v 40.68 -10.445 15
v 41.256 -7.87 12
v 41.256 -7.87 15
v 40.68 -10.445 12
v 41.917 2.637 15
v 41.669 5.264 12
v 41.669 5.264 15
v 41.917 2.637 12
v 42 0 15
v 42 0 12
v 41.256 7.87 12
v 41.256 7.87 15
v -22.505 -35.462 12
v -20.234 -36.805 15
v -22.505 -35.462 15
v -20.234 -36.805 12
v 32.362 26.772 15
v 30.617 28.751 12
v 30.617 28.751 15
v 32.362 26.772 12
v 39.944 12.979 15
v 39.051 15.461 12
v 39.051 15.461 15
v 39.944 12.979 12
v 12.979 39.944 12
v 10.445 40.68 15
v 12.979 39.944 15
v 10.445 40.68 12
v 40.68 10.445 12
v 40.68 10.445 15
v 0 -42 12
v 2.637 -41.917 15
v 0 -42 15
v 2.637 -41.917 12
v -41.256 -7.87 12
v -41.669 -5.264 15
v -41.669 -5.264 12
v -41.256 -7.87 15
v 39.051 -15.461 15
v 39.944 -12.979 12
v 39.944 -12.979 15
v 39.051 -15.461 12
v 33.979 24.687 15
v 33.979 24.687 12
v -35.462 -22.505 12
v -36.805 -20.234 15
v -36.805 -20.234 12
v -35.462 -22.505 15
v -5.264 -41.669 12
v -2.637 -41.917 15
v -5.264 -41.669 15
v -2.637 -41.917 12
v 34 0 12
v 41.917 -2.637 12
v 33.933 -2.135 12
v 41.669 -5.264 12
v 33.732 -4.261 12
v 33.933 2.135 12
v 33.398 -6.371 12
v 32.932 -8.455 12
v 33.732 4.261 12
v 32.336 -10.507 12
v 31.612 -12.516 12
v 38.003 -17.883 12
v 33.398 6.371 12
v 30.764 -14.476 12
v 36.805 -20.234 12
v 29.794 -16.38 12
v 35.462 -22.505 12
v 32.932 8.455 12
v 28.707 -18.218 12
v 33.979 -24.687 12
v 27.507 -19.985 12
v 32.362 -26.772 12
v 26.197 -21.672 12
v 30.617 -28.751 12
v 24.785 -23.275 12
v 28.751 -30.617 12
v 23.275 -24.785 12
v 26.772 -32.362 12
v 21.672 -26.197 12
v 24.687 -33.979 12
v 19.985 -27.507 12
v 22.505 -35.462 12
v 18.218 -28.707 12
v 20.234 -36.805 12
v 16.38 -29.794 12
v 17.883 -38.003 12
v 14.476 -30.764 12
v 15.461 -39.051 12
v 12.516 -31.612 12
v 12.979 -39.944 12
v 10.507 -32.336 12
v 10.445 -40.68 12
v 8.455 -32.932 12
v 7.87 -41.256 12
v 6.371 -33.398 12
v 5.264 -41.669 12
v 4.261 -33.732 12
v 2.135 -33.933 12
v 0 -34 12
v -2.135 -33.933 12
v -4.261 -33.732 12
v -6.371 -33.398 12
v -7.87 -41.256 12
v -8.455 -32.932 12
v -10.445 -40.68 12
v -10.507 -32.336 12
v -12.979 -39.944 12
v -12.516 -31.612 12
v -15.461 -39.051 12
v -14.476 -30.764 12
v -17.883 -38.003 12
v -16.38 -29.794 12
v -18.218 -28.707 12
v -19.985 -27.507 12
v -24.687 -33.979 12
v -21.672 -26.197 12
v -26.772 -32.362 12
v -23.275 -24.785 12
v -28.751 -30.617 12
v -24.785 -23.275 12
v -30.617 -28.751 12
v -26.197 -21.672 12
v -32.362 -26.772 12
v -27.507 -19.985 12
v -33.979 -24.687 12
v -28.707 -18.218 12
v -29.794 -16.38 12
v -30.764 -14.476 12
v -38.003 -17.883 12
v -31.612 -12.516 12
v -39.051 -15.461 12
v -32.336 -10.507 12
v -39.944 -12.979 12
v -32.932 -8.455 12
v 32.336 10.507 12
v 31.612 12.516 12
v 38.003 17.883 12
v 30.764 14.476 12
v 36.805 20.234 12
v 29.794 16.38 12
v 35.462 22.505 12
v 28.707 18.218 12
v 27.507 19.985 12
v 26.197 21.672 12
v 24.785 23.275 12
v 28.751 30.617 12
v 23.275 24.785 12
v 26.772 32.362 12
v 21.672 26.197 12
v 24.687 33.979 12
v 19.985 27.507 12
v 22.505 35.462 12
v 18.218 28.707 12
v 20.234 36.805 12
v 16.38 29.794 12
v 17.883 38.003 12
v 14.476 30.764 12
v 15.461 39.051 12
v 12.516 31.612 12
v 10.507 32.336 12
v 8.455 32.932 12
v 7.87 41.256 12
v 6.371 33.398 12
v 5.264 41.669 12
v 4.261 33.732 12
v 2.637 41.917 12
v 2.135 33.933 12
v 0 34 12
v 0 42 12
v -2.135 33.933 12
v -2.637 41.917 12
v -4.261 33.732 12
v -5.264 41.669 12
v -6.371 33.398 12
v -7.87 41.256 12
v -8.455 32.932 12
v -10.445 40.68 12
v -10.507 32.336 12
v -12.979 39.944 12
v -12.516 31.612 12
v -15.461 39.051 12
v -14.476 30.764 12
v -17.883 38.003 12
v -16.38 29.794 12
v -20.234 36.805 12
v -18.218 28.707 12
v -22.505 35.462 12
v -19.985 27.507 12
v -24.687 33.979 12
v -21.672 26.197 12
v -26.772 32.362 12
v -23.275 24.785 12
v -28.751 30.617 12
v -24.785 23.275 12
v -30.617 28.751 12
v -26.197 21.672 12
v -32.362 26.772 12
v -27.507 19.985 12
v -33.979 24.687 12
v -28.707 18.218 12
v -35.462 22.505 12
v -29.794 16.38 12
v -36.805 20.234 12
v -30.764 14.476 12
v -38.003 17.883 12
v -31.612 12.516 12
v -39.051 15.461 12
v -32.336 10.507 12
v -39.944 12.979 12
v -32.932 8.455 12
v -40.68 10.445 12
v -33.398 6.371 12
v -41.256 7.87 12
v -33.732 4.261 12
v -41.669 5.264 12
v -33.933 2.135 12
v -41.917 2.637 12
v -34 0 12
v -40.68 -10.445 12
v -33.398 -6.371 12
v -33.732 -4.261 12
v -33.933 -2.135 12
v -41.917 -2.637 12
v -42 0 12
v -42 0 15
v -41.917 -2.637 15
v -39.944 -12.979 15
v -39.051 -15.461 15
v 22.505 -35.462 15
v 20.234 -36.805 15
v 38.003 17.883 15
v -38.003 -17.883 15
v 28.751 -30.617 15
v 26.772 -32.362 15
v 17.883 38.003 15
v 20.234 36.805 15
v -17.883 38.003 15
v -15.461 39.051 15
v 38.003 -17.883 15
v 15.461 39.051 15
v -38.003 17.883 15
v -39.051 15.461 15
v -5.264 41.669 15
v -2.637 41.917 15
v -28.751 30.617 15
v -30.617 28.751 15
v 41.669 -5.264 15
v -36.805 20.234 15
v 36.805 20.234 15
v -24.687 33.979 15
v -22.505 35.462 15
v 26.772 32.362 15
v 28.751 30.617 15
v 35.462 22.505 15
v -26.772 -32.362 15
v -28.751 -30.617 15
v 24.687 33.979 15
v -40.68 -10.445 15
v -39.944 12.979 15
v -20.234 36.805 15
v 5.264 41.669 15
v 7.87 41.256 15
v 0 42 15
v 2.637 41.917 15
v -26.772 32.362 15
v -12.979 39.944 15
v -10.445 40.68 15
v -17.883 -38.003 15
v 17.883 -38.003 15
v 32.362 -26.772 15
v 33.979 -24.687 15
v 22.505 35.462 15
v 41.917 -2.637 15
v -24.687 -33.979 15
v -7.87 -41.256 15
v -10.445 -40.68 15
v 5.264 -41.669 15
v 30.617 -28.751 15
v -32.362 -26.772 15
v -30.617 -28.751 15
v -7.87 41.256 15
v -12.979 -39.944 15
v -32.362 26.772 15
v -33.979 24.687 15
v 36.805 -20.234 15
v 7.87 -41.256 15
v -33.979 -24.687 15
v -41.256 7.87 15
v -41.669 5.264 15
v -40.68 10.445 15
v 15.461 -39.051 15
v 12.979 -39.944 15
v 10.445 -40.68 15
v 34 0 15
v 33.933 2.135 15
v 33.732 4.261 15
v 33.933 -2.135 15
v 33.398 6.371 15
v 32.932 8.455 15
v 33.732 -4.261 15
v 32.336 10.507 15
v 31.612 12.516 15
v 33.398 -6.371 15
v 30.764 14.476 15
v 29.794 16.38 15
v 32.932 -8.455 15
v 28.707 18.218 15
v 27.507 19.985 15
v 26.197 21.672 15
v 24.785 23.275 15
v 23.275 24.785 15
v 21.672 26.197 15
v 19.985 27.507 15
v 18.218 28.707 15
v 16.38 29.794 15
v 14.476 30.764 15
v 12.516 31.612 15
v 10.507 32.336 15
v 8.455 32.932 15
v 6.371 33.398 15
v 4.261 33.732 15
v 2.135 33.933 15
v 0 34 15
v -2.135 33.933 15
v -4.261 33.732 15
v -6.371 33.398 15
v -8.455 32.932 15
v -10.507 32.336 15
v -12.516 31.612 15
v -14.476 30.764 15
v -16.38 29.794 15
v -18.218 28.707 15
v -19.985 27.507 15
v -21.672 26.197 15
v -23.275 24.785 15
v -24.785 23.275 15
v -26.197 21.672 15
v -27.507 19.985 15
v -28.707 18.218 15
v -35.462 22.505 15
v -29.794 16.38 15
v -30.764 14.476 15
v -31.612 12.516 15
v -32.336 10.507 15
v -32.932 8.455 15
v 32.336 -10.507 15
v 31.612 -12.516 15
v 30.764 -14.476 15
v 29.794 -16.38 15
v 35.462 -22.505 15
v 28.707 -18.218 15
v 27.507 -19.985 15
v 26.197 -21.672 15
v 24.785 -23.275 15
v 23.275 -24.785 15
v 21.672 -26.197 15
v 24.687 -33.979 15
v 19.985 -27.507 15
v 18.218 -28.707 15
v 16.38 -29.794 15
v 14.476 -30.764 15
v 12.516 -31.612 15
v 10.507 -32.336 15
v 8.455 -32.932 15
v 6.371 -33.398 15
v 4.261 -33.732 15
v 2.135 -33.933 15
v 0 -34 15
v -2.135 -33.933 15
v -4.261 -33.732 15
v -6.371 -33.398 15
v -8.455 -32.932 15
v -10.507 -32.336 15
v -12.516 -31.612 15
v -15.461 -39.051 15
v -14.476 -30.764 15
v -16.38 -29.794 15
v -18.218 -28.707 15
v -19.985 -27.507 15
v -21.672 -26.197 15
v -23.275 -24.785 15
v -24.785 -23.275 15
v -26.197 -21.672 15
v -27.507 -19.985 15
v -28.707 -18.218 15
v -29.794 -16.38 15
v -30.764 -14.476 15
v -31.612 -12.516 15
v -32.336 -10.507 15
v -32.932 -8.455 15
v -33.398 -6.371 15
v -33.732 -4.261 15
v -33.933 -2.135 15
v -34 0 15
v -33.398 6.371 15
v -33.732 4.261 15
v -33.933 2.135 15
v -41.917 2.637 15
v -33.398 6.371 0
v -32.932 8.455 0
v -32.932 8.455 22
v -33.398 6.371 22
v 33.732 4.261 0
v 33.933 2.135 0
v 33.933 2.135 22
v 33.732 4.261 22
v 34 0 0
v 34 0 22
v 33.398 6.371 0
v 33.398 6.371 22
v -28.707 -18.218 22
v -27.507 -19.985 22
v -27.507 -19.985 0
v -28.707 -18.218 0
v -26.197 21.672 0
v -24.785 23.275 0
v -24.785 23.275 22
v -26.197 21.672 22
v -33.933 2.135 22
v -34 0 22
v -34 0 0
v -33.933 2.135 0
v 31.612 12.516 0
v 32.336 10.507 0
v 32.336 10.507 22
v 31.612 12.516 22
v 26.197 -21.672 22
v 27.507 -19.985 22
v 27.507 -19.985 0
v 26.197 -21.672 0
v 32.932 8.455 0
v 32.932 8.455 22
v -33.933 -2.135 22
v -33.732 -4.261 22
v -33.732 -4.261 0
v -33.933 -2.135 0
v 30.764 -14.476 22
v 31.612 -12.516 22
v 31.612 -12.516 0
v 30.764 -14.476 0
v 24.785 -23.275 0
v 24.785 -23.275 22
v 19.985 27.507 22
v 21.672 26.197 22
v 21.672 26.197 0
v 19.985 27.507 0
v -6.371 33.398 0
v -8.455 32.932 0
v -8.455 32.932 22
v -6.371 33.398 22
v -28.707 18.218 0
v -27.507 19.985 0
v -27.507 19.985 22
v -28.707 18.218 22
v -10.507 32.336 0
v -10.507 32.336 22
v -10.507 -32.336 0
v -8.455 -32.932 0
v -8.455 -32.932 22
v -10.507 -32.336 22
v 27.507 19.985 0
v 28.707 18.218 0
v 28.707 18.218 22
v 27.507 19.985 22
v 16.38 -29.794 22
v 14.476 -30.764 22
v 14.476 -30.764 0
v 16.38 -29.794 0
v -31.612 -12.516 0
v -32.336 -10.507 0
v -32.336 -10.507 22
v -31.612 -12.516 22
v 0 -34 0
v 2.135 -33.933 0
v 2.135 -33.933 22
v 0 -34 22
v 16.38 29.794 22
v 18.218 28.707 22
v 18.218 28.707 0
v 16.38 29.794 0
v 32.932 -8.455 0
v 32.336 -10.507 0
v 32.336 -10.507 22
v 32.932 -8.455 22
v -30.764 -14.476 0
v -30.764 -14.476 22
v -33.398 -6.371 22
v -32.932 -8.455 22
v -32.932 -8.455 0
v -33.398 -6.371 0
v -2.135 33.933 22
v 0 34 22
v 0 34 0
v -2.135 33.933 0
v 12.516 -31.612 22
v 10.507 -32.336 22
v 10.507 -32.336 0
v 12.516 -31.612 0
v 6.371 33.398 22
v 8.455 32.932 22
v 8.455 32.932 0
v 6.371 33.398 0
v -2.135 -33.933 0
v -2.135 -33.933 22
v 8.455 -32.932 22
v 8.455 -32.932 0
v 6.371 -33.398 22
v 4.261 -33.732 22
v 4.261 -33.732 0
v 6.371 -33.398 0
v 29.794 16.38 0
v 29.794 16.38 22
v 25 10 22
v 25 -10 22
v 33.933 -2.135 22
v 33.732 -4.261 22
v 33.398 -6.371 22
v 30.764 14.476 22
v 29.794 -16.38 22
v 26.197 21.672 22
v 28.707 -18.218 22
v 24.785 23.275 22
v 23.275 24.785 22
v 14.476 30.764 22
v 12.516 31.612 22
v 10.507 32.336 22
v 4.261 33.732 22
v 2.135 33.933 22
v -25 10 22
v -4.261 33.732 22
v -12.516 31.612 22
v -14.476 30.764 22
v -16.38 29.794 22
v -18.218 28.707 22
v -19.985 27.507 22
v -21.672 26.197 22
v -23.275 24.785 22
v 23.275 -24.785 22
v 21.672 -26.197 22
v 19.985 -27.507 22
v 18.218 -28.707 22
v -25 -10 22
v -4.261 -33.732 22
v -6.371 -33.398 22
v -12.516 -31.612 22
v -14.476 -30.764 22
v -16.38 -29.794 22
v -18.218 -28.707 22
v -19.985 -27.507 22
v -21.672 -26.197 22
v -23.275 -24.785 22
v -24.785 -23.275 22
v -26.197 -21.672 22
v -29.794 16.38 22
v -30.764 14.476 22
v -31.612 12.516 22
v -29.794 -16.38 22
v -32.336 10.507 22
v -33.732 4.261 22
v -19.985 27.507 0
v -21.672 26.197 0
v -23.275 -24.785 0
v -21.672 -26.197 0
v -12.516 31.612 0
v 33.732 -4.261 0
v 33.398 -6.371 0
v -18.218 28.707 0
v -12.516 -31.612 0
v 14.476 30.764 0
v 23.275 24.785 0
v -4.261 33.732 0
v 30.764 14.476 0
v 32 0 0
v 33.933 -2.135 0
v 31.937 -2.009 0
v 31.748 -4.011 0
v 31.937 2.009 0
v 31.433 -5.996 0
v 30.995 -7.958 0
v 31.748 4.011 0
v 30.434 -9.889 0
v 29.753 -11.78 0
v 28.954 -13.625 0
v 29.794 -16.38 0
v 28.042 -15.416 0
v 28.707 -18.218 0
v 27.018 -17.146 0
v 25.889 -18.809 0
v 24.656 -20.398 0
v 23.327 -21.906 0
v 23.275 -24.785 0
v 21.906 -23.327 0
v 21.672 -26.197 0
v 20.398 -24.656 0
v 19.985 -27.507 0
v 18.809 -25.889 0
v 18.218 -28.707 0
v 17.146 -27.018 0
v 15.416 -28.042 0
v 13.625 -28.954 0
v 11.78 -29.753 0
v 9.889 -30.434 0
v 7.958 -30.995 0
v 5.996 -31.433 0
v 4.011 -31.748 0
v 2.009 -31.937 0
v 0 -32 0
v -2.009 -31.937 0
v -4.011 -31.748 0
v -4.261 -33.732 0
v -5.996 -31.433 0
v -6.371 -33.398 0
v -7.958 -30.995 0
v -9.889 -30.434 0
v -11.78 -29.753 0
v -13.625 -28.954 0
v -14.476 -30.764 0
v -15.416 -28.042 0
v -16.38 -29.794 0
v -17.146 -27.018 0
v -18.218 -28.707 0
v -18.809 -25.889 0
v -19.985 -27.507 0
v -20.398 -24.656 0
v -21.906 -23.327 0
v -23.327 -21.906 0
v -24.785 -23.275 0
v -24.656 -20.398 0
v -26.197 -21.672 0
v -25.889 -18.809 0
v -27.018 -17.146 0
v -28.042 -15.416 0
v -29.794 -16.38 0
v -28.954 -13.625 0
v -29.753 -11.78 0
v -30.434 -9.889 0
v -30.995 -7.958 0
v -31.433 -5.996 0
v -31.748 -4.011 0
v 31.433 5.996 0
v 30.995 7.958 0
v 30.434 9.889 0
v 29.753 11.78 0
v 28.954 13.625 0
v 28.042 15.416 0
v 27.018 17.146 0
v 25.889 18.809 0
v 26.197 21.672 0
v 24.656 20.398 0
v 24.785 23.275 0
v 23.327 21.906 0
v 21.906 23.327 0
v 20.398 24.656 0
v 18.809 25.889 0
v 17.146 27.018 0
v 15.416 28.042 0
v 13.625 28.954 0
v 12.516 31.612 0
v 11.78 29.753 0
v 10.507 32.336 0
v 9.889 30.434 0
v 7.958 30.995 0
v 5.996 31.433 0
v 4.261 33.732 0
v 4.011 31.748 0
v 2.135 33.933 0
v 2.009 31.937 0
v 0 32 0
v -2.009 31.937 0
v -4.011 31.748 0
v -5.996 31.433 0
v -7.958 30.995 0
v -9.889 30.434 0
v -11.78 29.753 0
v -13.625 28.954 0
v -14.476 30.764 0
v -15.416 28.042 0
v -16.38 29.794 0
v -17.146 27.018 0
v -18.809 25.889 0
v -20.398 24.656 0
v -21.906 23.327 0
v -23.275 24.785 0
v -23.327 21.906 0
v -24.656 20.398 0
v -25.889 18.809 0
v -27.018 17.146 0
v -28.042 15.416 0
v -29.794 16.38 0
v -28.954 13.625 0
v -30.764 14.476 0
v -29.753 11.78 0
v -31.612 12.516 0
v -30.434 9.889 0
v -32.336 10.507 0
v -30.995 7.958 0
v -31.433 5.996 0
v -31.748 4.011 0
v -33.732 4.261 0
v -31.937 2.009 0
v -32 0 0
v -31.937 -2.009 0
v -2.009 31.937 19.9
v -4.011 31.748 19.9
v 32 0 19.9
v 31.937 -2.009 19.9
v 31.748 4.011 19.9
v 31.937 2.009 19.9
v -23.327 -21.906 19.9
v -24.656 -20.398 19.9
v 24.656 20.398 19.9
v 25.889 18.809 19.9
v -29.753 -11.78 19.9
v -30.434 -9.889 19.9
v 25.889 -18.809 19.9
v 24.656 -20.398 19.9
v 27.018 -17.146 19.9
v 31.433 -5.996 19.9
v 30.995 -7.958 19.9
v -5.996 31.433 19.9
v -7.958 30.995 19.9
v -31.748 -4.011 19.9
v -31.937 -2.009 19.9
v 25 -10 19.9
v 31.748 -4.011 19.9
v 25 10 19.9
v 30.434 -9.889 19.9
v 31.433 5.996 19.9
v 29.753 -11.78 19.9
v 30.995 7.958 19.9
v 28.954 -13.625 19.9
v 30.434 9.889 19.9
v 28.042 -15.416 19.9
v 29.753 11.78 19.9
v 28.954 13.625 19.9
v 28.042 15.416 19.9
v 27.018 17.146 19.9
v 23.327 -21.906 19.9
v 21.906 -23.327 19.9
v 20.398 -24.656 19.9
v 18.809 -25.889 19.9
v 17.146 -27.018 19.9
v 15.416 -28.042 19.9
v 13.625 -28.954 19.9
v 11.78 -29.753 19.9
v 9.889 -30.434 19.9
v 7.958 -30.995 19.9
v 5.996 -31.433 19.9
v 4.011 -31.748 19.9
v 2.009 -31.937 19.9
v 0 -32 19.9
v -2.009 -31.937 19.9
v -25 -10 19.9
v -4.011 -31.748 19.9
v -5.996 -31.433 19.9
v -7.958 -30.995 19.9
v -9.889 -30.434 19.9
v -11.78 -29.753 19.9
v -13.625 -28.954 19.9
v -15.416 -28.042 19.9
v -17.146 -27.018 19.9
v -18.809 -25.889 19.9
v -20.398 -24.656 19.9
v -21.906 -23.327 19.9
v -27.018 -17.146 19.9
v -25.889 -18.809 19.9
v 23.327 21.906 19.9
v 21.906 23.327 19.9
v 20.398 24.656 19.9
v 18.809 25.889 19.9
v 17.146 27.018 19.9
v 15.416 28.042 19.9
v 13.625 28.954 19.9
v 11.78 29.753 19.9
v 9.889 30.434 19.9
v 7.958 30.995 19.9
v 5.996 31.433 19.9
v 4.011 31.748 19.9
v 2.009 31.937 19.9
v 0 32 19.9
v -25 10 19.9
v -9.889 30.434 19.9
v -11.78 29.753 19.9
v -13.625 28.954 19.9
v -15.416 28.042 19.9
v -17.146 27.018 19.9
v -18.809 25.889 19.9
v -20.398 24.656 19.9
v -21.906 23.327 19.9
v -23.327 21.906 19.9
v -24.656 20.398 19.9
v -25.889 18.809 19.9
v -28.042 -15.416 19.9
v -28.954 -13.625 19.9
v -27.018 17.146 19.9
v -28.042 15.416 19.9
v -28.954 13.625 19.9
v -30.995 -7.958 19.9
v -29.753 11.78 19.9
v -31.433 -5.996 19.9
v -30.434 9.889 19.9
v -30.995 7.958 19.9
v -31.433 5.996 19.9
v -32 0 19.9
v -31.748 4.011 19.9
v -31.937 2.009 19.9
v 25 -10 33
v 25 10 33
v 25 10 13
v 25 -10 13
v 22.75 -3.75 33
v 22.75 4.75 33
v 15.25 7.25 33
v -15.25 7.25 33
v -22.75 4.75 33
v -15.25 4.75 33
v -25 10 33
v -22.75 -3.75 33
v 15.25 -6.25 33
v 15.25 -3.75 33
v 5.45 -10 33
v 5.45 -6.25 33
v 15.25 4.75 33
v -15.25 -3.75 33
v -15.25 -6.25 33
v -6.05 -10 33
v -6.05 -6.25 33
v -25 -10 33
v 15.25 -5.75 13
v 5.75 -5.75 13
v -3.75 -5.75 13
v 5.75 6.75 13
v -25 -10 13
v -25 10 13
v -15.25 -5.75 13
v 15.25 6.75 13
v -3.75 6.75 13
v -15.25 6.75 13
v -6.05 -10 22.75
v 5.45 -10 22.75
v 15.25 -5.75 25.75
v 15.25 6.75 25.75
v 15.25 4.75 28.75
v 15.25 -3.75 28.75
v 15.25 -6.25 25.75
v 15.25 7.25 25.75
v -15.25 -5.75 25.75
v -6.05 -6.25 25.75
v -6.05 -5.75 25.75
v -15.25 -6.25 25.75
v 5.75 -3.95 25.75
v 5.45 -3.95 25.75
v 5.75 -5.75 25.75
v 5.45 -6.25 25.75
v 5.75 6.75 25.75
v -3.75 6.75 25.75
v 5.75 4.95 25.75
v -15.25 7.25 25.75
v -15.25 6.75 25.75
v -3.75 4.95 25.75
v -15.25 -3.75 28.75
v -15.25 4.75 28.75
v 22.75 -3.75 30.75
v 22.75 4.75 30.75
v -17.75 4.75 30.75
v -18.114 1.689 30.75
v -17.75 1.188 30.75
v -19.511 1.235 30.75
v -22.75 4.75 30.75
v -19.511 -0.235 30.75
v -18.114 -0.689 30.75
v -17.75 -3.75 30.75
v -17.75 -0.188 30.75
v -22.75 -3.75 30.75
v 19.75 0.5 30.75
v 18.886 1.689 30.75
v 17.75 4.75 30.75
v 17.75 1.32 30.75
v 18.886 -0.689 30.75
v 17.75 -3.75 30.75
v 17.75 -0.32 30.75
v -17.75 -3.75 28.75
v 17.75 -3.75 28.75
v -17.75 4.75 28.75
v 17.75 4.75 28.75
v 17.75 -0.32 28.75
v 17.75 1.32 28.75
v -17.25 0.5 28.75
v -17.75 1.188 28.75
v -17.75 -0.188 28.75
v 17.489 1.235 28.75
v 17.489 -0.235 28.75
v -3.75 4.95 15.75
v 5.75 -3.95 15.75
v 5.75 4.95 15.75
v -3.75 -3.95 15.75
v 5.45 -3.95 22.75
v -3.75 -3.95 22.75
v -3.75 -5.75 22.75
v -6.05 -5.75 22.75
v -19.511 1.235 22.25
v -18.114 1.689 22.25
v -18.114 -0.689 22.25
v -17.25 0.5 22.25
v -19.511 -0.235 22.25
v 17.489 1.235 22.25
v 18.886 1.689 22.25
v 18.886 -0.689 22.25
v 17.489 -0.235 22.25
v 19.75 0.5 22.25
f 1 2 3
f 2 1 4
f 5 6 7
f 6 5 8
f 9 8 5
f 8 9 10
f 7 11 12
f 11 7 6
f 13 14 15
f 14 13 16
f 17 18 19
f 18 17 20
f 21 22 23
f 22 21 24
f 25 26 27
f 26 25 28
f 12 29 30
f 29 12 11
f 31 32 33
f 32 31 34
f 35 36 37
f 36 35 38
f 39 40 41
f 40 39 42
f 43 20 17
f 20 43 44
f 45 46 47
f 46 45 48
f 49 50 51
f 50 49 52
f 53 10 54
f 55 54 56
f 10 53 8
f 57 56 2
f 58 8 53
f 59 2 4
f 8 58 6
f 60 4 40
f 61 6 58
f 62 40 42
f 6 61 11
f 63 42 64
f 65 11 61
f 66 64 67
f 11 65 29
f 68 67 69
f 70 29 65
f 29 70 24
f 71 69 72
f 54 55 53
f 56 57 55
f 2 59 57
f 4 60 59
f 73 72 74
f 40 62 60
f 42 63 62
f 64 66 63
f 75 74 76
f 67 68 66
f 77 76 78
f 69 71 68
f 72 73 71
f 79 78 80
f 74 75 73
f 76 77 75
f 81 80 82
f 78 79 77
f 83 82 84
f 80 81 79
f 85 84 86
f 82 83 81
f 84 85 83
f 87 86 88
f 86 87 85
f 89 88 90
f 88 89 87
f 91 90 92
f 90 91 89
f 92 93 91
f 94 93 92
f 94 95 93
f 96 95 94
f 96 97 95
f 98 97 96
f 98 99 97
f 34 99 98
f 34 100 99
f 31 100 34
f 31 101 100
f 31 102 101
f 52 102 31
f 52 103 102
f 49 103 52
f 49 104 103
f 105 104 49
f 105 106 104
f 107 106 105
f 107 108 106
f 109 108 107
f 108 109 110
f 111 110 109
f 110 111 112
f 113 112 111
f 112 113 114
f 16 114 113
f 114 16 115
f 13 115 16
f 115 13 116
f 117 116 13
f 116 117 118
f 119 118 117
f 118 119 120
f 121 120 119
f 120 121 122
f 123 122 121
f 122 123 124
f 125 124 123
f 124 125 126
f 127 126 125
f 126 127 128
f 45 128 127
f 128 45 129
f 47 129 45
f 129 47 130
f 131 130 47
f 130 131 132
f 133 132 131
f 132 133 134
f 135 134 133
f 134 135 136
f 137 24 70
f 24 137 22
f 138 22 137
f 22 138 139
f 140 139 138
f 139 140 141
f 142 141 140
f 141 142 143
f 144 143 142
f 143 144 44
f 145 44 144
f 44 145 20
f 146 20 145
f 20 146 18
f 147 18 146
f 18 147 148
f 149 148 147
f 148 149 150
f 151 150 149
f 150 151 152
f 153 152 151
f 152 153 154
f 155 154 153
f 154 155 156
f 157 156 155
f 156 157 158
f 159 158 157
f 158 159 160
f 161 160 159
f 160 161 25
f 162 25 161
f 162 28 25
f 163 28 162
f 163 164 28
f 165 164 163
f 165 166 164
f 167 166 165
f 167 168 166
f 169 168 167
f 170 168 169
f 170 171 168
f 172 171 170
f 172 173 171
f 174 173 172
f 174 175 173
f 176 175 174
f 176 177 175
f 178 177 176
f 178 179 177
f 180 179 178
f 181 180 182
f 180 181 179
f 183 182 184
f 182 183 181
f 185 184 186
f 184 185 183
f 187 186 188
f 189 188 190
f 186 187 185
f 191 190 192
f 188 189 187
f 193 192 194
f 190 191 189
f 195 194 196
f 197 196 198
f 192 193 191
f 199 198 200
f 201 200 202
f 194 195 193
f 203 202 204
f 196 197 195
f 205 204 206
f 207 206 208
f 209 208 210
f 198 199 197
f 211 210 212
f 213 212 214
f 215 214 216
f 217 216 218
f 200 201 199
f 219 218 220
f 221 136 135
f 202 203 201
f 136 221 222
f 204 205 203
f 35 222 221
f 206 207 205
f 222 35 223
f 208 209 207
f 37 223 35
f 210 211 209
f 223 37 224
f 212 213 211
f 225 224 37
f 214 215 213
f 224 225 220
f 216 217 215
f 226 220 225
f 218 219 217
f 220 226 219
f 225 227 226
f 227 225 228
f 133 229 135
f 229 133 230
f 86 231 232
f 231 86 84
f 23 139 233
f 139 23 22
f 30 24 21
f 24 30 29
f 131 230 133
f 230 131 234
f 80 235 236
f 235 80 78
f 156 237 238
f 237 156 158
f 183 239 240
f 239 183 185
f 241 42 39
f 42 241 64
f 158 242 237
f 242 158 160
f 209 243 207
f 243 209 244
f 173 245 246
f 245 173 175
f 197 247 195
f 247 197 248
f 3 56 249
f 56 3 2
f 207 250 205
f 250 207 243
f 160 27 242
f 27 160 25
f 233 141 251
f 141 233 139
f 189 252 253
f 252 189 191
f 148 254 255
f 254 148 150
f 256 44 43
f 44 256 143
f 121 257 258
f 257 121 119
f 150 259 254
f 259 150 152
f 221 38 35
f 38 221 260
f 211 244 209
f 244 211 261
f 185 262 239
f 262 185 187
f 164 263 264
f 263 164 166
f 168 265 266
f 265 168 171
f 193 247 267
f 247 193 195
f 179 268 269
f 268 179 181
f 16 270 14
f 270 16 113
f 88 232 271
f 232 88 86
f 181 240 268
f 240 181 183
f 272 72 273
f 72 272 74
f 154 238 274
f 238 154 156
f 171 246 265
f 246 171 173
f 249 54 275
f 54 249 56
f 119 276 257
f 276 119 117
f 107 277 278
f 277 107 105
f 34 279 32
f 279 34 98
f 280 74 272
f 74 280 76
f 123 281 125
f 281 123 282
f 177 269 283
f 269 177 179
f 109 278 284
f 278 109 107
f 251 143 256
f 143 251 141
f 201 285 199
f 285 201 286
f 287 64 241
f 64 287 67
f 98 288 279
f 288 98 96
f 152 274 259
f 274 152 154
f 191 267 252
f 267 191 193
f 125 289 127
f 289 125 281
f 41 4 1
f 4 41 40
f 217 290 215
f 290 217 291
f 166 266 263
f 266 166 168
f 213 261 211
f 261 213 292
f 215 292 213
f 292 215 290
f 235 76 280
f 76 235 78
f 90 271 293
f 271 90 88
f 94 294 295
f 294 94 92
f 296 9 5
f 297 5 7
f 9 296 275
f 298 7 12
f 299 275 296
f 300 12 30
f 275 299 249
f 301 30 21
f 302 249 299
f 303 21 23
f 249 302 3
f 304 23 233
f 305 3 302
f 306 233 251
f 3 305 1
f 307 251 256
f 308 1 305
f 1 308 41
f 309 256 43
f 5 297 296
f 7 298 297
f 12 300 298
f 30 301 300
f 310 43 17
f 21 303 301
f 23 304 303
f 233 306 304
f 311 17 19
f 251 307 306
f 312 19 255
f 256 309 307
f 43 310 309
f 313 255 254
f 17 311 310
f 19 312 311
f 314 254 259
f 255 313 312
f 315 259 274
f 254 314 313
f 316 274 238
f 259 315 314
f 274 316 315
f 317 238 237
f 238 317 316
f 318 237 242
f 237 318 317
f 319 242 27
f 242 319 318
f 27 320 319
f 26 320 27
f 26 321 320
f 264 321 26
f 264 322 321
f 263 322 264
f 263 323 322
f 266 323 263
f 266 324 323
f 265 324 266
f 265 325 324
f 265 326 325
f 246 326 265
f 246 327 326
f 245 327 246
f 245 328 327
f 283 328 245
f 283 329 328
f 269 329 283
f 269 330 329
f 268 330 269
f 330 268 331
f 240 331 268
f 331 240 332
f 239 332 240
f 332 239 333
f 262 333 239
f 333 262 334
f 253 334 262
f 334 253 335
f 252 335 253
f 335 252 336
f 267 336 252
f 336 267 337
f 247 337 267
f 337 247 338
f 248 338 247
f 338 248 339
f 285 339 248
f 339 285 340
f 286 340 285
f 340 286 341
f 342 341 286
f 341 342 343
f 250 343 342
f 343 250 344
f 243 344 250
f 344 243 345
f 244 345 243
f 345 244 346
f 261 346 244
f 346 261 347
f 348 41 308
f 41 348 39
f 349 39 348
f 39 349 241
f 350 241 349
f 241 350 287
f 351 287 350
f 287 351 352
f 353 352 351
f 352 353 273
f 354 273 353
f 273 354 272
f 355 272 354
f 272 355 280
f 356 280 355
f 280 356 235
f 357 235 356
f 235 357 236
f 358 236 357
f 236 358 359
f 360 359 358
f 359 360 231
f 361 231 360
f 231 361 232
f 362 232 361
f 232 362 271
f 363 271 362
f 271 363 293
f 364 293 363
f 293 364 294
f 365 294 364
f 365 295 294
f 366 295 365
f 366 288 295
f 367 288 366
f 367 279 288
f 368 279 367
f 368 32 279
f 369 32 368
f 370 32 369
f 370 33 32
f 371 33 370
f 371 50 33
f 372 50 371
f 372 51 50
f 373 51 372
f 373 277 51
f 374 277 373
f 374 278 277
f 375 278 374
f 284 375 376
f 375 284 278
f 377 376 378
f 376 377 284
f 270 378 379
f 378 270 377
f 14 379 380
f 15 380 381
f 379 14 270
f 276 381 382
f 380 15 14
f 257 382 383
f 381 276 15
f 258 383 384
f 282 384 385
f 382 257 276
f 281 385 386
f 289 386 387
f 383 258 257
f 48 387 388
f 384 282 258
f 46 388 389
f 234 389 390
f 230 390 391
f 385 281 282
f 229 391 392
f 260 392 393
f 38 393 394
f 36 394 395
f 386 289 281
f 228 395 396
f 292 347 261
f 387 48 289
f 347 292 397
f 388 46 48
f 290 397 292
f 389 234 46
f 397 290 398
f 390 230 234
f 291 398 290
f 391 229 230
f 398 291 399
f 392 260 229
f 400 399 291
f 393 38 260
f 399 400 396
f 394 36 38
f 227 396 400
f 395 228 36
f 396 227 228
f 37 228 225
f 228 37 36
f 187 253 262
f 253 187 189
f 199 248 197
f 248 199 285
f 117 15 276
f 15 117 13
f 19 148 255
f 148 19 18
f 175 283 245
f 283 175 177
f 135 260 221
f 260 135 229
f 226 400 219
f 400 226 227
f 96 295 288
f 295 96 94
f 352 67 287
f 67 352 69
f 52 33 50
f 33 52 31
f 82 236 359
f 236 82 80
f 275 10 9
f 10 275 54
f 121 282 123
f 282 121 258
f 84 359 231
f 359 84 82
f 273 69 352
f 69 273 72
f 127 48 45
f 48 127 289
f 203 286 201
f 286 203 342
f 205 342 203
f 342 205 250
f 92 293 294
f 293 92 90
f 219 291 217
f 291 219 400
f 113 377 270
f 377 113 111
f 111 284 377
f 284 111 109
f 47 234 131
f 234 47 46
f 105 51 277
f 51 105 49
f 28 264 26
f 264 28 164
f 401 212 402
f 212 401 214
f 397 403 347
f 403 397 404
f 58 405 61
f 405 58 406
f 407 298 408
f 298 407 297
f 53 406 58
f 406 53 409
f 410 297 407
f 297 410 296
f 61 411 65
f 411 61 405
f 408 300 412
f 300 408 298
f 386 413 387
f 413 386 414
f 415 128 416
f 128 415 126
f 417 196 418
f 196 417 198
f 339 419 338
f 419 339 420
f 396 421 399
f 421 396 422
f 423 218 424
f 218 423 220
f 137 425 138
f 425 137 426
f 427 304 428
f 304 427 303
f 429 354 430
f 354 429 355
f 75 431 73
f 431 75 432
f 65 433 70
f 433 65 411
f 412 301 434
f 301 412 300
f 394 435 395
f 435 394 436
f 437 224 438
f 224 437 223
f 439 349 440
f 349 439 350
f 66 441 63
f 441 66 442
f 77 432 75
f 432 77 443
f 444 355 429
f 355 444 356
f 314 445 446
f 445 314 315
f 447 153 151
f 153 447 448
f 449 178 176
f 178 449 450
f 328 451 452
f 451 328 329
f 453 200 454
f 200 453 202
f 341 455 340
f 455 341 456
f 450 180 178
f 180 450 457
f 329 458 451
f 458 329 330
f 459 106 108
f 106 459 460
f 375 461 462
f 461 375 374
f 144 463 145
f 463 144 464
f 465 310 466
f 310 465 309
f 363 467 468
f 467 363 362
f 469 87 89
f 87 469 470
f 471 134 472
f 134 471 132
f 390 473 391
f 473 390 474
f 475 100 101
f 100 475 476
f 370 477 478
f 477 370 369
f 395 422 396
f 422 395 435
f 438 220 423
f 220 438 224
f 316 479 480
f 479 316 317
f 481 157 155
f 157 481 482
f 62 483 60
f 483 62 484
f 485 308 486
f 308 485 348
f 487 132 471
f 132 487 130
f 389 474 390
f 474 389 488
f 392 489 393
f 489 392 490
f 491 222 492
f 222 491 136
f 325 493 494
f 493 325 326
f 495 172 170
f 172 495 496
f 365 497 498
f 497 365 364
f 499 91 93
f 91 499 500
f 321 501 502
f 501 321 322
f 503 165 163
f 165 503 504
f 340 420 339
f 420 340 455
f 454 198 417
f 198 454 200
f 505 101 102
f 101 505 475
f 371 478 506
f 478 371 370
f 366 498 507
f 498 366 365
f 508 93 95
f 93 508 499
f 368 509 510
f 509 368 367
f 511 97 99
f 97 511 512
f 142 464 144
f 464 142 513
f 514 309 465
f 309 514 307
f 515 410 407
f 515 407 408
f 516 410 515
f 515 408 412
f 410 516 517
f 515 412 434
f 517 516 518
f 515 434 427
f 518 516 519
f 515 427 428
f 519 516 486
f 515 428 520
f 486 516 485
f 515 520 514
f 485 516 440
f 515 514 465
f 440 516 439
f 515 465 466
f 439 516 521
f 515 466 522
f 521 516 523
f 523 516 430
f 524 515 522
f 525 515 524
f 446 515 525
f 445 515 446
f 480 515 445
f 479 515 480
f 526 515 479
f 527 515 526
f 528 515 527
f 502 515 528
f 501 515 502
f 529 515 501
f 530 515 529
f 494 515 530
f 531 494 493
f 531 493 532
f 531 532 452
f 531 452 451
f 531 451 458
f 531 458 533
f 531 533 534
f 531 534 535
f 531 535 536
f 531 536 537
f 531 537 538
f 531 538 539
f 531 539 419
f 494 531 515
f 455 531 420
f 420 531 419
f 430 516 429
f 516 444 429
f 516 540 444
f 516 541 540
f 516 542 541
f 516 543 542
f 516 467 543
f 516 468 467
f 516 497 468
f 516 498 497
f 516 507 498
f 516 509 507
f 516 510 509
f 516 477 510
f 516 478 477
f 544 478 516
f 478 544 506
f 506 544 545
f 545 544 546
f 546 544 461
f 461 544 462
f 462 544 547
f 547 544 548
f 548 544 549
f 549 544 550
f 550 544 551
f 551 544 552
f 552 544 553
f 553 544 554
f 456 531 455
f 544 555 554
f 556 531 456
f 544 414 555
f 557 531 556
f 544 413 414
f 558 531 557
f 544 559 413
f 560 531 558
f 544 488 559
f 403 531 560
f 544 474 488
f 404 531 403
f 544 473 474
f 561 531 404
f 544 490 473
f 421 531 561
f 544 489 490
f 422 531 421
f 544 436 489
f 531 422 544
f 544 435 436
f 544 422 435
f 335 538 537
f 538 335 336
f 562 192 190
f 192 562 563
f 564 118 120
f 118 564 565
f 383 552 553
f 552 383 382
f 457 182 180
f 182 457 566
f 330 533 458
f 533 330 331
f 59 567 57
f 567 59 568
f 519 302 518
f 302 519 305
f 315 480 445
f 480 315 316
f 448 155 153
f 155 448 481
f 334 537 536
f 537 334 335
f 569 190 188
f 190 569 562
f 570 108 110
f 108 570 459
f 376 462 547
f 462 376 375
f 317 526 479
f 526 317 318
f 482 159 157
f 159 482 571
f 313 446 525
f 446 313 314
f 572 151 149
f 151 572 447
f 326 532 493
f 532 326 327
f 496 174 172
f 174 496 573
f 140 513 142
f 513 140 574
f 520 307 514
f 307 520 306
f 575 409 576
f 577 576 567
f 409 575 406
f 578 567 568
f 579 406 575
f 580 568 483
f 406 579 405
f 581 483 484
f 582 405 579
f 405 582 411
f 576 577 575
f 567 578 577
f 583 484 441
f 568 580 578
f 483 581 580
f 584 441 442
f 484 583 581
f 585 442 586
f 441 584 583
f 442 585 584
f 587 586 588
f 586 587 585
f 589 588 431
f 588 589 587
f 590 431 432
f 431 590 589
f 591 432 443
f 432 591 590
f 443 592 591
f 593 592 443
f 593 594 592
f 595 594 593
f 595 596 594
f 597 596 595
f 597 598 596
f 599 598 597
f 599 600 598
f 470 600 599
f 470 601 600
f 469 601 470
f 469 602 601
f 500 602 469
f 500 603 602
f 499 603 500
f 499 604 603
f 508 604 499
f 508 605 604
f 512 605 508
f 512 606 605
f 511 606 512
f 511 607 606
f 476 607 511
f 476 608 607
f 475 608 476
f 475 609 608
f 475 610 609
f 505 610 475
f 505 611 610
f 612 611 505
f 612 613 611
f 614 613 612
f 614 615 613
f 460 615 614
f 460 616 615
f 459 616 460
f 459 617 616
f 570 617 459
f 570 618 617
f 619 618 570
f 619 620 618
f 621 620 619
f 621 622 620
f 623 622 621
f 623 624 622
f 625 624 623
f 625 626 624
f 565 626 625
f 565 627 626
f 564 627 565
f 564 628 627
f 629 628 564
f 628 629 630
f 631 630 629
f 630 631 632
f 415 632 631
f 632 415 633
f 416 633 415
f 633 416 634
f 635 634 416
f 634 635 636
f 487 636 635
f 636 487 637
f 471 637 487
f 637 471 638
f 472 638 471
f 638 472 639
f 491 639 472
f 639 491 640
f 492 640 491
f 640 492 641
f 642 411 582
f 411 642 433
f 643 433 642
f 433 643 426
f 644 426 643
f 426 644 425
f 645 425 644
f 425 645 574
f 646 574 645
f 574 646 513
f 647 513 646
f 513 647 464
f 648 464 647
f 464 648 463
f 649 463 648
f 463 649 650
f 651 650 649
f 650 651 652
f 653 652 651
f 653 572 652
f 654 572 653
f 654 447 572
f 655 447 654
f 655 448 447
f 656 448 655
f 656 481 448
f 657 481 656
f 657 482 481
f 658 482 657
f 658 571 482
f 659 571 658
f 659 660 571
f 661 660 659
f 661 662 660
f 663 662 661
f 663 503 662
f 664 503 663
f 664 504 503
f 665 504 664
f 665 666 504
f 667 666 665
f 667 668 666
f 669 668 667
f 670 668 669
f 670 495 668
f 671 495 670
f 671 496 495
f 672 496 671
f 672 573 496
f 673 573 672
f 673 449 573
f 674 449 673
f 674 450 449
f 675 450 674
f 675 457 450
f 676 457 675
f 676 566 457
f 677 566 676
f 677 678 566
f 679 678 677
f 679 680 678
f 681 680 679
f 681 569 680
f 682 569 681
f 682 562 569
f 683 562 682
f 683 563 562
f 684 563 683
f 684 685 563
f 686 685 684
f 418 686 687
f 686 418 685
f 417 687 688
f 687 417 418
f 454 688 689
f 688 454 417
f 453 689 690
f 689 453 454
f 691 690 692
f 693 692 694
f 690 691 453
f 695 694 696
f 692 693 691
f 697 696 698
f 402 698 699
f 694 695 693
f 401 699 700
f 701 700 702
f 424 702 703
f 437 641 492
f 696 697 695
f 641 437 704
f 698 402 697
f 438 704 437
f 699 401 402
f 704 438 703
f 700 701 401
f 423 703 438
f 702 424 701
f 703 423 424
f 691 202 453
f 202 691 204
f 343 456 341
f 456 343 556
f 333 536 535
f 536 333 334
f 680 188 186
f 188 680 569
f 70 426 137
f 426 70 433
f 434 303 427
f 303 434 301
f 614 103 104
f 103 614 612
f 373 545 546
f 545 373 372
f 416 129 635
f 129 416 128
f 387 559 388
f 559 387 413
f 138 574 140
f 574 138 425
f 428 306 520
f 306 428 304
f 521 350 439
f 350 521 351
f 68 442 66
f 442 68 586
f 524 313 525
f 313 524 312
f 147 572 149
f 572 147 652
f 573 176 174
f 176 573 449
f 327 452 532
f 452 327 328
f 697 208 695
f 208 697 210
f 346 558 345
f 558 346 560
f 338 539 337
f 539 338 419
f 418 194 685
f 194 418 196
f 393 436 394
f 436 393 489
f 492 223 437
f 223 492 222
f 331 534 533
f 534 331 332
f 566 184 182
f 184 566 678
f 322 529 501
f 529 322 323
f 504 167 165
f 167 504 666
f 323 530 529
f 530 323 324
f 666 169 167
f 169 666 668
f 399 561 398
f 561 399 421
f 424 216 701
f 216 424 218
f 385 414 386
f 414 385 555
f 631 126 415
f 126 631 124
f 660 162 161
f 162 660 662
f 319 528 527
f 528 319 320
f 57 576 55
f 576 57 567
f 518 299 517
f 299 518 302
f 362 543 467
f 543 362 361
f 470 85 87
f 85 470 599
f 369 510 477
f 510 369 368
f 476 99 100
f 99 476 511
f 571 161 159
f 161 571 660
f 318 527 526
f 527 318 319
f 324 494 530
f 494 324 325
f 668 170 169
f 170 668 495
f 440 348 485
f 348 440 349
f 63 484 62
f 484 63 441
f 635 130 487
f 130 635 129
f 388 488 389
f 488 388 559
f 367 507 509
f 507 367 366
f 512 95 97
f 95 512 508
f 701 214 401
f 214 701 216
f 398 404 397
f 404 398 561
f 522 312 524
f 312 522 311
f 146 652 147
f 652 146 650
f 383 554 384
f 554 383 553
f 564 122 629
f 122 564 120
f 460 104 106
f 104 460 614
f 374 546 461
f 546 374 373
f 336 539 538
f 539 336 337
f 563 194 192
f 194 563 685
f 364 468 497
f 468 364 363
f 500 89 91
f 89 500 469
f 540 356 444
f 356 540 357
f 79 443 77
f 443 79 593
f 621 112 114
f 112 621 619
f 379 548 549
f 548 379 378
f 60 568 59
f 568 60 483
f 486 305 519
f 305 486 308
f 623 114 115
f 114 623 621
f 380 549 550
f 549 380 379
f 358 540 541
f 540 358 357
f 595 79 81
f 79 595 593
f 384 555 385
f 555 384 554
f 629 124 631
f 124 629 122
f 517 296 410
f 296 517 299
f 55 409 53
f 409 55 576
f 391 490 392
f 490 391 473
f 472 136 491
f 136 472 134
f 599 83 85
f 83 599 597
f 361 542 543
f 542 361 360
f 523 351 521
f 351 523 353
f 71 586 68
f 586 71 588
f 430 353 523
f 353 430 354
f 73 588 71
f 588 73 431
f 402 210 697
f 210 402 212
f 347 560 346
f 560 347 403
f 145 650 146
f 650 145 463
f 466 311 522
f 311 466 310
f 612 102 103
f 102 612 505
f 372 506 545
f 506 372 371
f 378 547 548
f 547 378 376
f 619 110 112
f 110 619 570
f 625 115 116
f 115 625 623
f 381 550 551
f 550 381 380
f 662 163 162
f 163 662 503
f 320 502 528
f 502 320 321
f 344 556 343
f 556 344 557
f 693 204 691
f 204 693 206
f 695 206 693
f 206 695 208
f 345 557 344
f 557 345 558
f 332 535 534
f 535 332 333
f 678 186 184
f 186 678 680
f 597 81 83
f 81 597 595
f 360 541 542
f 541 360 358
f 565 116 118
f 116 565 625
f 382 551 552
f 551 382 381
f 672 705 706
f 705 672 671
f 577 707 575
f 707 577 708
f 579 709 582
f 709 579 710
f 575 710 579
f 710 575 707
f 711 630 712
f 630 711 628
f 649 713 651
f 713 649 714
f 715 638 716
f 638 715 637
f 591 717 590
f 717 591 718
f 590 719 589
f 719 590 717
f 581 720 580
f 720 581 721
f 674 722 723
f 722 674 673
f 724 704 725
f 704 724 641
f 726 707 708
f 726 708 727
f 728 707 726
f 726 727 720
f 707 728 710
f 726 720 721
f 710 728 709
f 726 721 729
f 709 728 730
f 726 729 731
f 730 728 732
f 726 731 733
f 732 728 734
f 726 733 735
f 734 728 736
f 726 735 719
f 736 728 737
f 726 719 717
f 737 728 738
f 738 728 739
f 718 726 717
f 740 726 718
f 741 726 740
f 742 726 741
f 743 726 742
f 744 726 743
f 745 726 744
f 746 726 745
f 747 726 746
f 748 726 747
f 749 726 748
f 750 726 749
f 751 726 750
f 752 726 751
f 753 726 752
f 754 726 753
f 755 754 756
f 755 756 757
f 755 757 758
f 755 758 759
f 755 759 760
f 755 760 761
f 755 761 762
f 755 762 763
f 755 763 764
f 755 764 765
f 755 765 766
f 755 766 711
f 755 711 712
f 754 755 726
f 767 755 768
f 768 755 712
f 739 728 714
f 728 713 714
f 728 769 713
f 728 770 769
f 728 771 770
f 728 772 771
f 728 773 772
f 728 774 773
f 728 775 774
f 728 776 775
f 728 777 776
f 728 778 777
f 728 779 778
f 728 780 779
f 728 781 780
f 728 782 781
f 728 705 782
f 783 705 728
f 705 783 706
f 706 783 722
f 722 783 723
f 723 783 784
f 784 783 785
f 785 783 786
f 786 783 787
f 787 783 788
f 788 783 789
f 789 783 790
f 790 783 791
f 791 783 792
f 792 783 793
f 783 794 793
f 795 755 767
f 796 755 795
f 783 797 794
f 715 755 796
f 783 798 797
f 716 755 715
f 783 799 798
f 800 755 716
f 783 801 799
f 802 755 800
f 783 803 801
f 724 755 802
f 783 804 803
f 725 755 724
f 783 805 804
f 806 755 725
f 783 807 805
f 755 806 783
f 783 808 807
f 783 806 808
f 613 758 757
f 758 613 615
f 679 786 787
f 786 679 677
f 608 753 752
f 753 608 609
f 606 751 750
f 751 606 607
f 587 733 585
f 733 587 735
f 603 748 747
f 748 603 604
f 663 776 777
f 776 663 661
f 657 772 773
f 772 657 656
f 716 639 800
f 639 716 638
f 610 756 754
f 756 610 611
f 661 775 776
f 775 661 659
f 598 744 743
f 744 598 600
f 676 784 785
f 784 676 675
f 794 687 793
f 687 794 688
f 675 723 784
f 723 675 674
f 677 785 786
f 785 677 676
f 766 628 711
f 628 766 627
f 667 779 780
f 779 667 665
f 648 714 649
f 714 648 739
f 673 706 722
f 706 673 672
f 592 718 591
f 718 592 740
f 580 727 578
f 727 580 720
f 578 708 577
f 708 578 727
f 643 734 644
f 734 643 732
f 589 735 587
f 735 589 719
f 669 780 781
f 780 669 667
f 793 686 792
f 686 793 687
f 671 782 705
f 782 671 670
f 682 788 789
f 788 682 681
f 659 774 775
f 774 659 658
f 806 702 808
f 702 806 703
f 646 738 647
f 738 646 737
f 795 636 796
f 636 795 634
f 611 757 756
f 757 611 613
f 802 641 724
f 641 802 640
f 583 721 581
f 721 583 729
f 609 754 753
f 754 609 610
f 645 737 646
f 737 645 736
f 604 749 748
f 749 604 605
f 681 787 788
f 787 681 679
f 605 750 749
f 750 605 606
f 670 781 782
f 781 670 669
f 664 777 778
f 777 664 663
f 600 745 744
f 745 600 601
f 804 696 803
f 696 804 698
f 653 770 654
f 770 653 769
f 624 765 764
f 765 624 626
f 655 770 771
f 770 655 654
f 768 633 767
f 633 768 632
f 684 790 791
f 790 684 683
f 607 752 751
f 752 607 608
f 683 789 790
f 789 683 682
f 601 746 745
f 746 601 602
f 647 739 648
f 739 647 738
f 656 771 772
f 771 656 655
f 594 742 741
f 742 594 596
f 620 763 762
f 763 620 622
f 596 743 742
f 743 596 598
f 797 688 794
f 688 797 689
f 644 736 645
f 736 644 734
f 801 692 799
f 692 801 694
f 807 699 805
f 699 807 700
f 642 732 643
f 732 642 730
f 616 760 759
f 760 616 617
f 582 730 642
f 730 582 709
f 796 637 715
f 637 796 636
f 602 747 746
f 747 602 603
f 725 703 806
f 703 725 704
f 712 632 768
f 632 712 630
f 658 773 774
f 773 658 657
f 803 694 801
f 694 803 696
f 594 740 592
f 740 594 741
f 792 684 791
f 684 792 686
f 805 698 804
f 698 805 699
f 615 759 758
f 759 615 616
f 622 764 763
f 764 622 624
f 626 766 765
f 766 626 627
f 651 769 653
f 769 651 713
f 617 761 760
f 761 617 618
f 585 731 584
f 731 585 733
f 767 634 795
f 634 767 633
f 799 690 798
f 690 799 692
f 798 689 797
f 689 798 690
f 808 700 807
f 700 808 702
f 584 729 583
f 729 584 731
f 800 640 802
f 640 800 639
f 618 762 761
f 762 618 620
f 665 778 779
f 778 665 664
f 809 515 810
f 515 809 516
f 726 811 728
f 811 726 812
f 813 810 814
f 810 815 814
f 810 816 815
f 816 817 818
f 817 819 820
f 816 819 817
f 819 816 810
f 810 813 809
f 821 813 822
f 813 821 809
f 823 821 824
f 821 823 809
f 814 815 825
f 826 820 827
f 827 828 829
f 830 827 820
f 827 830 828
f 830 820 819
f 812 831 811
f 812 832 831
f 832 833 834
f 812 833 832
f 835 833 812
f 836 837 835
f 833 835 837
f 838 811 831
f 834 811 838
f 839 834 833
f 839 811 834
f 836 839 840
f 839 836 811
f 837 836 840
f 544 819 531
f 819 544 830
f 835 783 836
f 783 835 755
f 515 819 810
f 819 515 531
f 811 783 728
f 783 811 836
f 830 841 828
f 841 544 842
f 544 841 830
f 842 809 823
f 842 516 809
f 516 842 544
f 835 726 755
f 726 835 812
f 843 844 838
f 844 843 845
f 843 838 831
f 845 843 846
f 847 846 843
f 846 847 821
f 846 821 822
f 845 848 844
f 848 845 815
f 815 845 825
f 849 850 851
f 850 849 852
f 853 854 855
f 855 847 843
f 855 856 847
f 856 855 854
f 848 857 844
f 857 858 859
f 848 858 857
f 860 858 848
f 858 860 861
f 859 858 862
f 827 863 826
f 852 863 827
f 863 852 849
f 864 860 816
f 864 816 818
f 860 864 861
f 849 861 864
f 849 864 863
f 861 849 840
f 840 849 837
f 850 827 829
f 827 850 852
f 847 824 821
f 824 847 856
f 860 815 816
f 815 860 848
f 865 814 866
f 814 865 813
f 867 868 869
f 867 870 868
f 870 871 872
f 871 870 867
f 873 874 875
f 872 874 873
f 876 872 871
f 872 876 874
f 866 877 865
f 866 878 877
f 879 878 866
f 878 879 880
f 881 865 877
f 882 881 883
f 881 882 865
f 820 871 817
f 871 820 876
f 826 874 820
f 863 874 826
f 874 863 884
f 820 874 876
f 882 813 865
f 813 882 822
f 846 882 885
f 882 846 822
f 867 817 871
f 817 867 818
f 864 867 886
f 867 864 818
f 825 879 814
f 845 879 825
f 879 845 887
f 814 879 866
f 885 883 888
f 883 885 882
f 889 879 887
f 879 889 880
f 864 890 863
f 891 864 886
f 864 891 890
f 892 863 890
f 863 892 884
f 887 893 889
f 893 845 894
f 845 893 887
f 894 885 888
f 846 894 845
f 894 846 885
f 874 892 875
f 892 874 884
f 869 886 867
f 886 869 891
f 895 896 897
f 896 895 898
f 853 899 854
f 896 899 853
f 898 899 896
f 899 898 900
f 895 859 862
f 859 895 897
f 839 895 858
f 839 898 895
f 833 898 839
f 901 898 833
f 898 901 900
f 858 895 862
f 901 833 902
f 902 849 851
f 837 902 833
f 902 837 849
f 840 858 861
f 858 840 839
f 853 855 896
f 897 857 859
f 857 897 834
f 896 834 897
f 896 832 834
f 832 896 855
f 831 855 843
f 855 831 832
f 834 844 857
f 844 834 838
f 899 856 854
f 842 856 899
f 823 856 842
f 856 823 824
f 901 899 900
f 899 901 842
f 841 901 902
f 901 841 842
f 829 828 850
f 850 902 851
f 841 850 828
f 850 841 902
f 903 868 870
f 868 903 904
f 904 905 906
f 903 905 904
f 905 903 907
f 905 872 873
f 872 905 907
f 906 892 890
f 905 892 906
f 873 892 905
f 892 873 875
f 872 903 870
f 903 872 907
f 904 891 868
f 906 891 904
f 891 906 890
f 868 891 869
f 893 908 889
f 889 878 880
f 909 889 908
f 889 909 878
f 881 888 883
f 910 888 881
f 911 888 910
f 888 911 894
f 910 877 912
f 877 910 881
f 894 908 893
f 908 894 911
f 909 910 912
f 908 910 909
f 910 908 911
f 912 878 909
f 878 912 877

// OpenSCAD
// file: ../../template/sensor/lidar_neg.scad
module lidar_neg() {
    
    // scale factor (addition)
    s = 0.5;
    ts = s/2;
    
    screw_01_vector = [-4+s, 6+s, 0+s];
    screw_02_vector = [33+s, 6+s, 0+s];

    screw_rad = 1+ts;
    screw_length = 10+ts;

    sender_vector = [11+s, 12+s, 22+s];
    
    receiv_vector = [09+s, 12+s, 22+s];
    
    baseblock_vector = [30+s, 13+s, 7+s];
    
    holder_flat_vector = [45+s, 8+s, 2+s];
    
    holder_vector = [35+s, 8+s, 4+s];
    
    stage_vector = [30+s, 8.4+s, 17+s];
    
    connector_vector = [11+s, 20+s, 10+s];


    union() {
        translate([0-ts, 0-ts, 0-ts]) {
            cube(baseblock_vector);
        }

        translate([((45-30)/2*-1)-ts, ((13-8)/2)-ts, 0-ts]) {
            cube(holder_flat_vector);
        }

        translate([((35-30)/2*-1-ts), ((13-8)/2)-ts, 0-ts]) {
            cube(holder_vector);
        }
        translate([0-ts, (13-8.4)/2-ts, 0-ts]) {
            cube(stage_vector);
        }
        translate([0-ts, 0.5-ts, 0-ts]) {
            cube(sender_vector);
        }
        translate([21-ts, 0.5-ts, 0-ts]) {
            cube(receiv_vector);
        }
        translate([9.2-ts, 11-ts, 0-ts]) {
            cube(connector_vector);
        }
        translate(screw_01_vector)
            cylinder(screw_length, screw_rad, screw_rad);
        translate(screw_02_vector)
            cylinder(screw_length, screw_rad, screw_rad);
    }
}
// main file
use <../../template/sensor/lidar_neg.scad>

module oiltank_cap() {
    
    union() {
        
        outer_ring_diameter = 68;
        outer_ring_height = 22;
        outer_ring_thickness = 2;
        
        outer_ring_into_tank = 12;
        
        outer_plate_diameter = 84;
        outer_plate_height = 3;

        
        
        difference() {
            union() {
                translate([0,0,outer_ring_into_tank]) 
                cylinder(
                    outer_plate_height,
                    outer_plate_diameter/2,
                    outer_plate_diameter/2,
                    $fn=100);
                cylinder(
                    outer_ring_height,
                    outer_ring_diameter/2,
                    outer_ring_diameter/2,
                    $fn=100);
            }
            translate([0,0,-0.1]) 
                cylinder(
                    outer_ring_height - outer_ring_thickness,
                    outer_ring_diameter/2 - outer_ring_thickness,
                    outer_ring_diameter/2 - outer_ring_thickness,
                    $fn=100);
        }
    }
    
}


    level = 5;
    
    difference() {
        union() {
            oiltank_cap();
            translate([-50/2,-20/2,18-level]) {
                cube([50, 20, 20]);
            }
        }
        translate([-15,7,38-level])
            rotate([180,0,0])
                lidar_neg();
    }
    
